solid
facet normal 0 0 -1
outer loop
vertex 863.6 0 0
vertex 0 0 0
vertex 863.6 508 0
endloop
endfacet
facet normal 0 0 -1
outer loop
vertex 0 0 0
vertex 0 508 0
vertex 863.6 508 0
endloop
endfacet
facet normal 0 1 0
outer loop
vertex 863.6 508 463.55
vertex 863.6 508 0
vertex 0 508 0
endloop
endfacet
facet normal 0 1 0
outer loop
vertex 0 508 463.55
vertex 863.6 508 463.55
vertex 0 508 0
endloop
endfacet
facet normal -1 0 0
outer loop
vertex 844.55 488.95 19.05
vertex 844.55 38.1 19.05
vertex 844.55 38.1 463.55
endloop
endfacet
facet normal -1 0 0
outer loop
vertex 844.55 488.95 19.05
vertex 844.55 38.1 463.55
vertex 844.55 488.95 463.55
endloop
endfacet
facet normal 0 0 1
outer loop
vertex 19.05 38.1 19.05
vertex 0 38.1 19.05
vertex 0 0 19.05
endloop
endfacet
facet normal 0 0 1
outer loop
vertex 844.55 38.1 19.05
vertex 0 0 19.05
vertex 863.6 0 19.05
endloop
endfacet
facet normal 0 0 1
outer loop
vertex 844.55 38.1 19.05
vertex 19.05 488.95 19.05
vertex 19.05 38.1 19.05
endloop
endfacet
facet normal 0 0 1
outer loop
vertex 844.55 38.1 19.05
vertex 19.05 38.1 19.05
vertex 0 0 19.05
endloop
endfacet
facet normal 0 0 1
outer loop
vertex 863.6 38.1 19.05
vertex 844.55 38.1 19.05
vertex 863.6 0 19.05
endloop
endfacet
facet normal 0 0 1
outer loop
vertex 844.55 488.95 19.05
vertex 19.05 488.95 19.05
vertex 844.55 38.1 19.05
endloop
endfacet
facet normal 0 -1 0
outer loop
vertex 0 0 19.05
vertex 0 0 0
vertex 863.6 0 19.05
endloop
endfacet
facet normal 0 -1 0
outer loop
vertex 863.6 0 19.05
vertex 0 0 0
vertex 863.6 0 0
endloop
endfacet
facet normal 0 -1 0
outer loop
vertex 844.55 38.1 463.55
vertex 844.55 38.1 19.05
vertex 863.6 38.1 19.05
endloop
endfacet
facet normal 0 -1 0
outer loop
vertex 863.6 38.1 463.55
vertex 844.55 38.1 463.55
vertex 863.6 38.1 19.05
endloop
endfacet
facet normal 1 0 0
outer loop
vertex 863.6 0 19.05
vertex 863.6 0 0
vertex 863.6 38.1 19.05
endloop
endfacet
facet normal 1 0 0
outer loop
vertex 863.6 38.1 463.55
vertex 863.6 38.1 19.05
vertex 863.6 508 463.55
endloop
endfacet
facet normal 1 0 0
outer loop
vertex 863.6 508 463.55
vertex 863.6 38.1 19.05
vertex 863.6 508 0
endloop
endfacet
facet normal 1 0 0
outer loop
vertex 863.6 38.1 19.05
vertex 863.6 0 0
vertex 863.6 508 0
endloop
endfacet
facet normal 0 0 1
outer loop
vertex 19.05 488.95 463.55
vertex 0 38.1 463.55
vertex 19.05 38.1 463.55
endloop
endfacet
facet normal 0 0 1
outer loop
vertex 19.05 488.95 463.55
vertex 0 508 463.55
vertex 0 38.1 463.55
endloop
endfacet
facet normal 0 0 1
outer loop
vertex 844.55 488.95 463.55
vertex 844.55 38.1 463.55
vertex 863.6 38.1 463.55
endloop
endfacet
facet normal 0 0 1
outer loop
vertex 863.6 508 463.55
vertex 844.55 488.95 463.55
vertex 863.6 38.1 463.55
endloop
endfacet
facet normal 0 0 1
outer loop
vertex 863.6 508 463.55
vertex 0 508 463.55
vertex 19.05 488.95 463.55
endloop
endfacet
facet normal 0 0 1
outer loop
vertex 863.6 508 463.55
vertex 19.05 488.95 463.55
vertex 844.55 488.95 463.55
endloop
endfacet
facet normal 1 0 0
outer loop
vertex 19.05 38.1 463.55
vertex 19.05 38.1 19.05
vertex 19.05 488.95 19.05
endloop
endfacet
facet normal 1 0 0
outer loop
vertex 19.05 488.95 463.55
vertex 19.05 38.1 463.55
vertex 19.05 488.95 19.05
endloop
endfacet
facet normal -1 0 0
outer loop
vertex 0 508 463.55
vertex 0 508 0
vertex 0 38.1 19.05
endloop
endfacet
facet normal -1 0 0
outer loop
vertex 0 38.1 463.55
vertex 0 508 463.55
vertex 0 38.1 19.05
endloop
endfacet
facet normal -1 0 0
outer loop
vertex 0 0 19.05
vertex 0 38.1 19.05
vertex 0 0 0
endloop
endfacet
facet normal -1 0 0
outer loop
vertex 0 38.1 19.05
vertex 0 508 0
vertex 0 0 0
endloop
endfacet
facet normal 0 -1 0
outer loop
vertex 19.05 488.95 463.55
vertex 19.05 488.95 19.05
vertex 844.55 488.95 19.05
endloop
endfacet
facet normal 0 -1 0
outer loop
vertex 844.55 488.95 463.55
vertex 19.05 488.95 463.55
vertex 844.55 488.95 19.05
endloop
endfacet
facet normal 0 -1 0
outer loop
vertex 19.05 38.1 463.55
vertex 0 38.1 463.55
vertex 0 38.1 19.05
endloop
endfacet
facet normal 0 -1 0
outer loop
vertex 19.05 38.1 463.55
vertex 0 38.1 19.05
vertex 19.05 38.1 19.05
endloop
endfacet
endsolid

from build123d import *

# Parameters (mm, degrees)
F0_W     = 19.05
F0_H     = 450.85
F1_DEPTH = 463.55
F2_DEPTH = 19.05


with BuildPart() as f1:
    # F0 (on Top) → F1 (new body)
    with BuildSketch(Plane.XY):
        with Locations((9.525, 263.525)):
            Rectangle(F0_W, F0_H)
        Polygon((0, 508), (0, 488.95), (19.05, 488.95), (844.55, 488.95), (863.6, 488.95), (863.6, 508), align=None)
        with Locations((854.075, 263.525)):
            Rectangle(F0_W, F0_H)
    extrude(amount=F1_DEPTH)

    # F0 (on Top) → F2 (join)
    with BuildSketch(Plane.XY):
        Polygon((0, 38.1), (0, 0), (863.6, 0), (863.6, 38.1), (844.55, 38.1), (844.55, 488.95), (19.05, 488.95), (19.05, 38.1), align=None)
    extrude(amount=F2_DEPTH)


solid = f1.part
